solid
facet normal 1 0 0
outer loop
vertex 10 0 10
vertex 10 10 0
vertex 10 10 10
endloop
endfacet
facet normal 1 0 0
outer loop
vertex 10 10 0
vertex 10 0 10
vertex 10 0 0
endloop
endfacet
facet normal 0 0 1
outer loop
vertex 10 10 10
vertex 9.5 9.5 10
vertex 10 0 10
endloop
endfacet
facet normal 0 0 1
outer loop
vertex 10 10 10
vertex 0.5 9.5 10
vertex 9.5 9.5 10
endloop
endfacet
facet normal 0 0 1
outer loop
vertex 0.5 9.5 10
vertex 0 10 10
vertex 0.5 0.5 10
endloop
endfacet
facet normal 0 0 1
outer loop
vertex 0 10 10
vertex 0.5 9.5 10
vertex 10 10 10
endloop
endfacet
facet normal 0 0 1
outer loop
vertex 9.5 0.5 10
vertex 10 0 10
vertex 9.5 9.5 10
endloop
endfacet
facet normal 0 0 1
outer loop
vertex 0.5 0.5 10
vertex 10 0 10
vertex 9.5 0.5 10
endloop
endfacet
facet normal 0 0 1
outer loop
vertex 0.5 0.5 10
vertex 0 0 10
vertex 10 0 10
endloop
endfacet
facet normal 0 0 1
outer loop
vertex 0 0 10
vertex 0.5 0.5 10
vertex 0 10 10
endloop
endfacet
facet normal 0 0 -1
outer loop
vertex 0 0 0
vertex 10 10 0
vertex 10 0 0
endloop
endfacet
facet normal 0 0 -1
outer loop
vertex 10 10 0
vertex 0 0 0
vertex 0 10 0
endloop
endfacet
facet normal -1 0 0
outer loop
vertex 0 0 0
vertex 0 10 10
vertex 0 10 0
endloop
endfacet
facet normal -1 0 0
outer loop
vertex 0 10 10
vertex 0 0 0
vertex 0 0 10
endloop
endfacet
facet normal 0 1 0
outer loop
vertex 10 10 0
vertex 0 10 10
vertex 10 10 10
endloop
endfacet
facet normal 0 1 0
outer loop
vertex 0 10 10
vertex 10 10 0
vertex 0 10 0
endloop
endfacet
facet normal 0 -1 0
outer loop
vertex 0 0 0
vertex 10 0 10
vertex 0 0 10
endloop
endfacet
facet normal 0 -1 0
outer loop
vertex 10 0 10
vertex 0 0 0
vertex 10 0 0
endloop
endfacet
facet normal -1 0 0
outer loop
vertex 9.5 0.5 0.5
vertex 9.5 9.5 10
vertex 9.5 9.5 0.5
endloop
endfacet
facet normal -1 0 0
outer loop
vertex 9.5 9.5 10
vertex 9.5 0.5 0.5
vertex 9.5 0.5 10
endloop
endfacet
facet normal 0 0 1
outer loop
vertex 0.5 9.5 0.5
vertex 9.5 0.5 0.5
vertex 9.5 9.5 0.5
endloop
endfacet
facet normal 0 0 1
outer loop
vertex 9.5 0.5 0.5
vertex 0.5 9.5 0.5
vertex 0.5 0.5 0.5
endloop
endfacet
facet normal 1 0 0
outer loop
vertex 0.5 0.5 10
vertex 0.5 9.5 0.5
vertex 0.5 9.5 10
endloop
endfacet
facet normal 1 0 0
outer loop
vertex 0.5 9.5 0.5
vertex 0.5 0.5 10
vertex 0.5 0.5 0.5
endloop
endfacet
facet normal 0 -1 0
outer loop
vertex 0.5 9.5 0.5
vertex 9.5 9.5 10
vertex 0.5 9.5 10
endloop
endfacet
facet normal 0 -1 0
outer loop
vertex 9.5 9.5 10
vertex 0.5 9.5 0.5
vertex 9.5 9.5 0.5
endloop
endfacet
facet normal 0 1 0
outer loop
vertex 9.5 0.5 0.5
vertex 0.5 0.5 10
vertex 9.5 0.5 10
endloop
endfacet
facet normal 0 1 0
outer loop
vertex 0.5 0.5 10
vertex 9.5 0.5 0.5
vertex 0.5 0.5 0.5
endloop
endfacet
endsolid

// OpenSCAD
difference() {
cube([10,10,10]);
translate([.5,.5,.5]) cube([10,10,10]-[1,1,0]);
}
